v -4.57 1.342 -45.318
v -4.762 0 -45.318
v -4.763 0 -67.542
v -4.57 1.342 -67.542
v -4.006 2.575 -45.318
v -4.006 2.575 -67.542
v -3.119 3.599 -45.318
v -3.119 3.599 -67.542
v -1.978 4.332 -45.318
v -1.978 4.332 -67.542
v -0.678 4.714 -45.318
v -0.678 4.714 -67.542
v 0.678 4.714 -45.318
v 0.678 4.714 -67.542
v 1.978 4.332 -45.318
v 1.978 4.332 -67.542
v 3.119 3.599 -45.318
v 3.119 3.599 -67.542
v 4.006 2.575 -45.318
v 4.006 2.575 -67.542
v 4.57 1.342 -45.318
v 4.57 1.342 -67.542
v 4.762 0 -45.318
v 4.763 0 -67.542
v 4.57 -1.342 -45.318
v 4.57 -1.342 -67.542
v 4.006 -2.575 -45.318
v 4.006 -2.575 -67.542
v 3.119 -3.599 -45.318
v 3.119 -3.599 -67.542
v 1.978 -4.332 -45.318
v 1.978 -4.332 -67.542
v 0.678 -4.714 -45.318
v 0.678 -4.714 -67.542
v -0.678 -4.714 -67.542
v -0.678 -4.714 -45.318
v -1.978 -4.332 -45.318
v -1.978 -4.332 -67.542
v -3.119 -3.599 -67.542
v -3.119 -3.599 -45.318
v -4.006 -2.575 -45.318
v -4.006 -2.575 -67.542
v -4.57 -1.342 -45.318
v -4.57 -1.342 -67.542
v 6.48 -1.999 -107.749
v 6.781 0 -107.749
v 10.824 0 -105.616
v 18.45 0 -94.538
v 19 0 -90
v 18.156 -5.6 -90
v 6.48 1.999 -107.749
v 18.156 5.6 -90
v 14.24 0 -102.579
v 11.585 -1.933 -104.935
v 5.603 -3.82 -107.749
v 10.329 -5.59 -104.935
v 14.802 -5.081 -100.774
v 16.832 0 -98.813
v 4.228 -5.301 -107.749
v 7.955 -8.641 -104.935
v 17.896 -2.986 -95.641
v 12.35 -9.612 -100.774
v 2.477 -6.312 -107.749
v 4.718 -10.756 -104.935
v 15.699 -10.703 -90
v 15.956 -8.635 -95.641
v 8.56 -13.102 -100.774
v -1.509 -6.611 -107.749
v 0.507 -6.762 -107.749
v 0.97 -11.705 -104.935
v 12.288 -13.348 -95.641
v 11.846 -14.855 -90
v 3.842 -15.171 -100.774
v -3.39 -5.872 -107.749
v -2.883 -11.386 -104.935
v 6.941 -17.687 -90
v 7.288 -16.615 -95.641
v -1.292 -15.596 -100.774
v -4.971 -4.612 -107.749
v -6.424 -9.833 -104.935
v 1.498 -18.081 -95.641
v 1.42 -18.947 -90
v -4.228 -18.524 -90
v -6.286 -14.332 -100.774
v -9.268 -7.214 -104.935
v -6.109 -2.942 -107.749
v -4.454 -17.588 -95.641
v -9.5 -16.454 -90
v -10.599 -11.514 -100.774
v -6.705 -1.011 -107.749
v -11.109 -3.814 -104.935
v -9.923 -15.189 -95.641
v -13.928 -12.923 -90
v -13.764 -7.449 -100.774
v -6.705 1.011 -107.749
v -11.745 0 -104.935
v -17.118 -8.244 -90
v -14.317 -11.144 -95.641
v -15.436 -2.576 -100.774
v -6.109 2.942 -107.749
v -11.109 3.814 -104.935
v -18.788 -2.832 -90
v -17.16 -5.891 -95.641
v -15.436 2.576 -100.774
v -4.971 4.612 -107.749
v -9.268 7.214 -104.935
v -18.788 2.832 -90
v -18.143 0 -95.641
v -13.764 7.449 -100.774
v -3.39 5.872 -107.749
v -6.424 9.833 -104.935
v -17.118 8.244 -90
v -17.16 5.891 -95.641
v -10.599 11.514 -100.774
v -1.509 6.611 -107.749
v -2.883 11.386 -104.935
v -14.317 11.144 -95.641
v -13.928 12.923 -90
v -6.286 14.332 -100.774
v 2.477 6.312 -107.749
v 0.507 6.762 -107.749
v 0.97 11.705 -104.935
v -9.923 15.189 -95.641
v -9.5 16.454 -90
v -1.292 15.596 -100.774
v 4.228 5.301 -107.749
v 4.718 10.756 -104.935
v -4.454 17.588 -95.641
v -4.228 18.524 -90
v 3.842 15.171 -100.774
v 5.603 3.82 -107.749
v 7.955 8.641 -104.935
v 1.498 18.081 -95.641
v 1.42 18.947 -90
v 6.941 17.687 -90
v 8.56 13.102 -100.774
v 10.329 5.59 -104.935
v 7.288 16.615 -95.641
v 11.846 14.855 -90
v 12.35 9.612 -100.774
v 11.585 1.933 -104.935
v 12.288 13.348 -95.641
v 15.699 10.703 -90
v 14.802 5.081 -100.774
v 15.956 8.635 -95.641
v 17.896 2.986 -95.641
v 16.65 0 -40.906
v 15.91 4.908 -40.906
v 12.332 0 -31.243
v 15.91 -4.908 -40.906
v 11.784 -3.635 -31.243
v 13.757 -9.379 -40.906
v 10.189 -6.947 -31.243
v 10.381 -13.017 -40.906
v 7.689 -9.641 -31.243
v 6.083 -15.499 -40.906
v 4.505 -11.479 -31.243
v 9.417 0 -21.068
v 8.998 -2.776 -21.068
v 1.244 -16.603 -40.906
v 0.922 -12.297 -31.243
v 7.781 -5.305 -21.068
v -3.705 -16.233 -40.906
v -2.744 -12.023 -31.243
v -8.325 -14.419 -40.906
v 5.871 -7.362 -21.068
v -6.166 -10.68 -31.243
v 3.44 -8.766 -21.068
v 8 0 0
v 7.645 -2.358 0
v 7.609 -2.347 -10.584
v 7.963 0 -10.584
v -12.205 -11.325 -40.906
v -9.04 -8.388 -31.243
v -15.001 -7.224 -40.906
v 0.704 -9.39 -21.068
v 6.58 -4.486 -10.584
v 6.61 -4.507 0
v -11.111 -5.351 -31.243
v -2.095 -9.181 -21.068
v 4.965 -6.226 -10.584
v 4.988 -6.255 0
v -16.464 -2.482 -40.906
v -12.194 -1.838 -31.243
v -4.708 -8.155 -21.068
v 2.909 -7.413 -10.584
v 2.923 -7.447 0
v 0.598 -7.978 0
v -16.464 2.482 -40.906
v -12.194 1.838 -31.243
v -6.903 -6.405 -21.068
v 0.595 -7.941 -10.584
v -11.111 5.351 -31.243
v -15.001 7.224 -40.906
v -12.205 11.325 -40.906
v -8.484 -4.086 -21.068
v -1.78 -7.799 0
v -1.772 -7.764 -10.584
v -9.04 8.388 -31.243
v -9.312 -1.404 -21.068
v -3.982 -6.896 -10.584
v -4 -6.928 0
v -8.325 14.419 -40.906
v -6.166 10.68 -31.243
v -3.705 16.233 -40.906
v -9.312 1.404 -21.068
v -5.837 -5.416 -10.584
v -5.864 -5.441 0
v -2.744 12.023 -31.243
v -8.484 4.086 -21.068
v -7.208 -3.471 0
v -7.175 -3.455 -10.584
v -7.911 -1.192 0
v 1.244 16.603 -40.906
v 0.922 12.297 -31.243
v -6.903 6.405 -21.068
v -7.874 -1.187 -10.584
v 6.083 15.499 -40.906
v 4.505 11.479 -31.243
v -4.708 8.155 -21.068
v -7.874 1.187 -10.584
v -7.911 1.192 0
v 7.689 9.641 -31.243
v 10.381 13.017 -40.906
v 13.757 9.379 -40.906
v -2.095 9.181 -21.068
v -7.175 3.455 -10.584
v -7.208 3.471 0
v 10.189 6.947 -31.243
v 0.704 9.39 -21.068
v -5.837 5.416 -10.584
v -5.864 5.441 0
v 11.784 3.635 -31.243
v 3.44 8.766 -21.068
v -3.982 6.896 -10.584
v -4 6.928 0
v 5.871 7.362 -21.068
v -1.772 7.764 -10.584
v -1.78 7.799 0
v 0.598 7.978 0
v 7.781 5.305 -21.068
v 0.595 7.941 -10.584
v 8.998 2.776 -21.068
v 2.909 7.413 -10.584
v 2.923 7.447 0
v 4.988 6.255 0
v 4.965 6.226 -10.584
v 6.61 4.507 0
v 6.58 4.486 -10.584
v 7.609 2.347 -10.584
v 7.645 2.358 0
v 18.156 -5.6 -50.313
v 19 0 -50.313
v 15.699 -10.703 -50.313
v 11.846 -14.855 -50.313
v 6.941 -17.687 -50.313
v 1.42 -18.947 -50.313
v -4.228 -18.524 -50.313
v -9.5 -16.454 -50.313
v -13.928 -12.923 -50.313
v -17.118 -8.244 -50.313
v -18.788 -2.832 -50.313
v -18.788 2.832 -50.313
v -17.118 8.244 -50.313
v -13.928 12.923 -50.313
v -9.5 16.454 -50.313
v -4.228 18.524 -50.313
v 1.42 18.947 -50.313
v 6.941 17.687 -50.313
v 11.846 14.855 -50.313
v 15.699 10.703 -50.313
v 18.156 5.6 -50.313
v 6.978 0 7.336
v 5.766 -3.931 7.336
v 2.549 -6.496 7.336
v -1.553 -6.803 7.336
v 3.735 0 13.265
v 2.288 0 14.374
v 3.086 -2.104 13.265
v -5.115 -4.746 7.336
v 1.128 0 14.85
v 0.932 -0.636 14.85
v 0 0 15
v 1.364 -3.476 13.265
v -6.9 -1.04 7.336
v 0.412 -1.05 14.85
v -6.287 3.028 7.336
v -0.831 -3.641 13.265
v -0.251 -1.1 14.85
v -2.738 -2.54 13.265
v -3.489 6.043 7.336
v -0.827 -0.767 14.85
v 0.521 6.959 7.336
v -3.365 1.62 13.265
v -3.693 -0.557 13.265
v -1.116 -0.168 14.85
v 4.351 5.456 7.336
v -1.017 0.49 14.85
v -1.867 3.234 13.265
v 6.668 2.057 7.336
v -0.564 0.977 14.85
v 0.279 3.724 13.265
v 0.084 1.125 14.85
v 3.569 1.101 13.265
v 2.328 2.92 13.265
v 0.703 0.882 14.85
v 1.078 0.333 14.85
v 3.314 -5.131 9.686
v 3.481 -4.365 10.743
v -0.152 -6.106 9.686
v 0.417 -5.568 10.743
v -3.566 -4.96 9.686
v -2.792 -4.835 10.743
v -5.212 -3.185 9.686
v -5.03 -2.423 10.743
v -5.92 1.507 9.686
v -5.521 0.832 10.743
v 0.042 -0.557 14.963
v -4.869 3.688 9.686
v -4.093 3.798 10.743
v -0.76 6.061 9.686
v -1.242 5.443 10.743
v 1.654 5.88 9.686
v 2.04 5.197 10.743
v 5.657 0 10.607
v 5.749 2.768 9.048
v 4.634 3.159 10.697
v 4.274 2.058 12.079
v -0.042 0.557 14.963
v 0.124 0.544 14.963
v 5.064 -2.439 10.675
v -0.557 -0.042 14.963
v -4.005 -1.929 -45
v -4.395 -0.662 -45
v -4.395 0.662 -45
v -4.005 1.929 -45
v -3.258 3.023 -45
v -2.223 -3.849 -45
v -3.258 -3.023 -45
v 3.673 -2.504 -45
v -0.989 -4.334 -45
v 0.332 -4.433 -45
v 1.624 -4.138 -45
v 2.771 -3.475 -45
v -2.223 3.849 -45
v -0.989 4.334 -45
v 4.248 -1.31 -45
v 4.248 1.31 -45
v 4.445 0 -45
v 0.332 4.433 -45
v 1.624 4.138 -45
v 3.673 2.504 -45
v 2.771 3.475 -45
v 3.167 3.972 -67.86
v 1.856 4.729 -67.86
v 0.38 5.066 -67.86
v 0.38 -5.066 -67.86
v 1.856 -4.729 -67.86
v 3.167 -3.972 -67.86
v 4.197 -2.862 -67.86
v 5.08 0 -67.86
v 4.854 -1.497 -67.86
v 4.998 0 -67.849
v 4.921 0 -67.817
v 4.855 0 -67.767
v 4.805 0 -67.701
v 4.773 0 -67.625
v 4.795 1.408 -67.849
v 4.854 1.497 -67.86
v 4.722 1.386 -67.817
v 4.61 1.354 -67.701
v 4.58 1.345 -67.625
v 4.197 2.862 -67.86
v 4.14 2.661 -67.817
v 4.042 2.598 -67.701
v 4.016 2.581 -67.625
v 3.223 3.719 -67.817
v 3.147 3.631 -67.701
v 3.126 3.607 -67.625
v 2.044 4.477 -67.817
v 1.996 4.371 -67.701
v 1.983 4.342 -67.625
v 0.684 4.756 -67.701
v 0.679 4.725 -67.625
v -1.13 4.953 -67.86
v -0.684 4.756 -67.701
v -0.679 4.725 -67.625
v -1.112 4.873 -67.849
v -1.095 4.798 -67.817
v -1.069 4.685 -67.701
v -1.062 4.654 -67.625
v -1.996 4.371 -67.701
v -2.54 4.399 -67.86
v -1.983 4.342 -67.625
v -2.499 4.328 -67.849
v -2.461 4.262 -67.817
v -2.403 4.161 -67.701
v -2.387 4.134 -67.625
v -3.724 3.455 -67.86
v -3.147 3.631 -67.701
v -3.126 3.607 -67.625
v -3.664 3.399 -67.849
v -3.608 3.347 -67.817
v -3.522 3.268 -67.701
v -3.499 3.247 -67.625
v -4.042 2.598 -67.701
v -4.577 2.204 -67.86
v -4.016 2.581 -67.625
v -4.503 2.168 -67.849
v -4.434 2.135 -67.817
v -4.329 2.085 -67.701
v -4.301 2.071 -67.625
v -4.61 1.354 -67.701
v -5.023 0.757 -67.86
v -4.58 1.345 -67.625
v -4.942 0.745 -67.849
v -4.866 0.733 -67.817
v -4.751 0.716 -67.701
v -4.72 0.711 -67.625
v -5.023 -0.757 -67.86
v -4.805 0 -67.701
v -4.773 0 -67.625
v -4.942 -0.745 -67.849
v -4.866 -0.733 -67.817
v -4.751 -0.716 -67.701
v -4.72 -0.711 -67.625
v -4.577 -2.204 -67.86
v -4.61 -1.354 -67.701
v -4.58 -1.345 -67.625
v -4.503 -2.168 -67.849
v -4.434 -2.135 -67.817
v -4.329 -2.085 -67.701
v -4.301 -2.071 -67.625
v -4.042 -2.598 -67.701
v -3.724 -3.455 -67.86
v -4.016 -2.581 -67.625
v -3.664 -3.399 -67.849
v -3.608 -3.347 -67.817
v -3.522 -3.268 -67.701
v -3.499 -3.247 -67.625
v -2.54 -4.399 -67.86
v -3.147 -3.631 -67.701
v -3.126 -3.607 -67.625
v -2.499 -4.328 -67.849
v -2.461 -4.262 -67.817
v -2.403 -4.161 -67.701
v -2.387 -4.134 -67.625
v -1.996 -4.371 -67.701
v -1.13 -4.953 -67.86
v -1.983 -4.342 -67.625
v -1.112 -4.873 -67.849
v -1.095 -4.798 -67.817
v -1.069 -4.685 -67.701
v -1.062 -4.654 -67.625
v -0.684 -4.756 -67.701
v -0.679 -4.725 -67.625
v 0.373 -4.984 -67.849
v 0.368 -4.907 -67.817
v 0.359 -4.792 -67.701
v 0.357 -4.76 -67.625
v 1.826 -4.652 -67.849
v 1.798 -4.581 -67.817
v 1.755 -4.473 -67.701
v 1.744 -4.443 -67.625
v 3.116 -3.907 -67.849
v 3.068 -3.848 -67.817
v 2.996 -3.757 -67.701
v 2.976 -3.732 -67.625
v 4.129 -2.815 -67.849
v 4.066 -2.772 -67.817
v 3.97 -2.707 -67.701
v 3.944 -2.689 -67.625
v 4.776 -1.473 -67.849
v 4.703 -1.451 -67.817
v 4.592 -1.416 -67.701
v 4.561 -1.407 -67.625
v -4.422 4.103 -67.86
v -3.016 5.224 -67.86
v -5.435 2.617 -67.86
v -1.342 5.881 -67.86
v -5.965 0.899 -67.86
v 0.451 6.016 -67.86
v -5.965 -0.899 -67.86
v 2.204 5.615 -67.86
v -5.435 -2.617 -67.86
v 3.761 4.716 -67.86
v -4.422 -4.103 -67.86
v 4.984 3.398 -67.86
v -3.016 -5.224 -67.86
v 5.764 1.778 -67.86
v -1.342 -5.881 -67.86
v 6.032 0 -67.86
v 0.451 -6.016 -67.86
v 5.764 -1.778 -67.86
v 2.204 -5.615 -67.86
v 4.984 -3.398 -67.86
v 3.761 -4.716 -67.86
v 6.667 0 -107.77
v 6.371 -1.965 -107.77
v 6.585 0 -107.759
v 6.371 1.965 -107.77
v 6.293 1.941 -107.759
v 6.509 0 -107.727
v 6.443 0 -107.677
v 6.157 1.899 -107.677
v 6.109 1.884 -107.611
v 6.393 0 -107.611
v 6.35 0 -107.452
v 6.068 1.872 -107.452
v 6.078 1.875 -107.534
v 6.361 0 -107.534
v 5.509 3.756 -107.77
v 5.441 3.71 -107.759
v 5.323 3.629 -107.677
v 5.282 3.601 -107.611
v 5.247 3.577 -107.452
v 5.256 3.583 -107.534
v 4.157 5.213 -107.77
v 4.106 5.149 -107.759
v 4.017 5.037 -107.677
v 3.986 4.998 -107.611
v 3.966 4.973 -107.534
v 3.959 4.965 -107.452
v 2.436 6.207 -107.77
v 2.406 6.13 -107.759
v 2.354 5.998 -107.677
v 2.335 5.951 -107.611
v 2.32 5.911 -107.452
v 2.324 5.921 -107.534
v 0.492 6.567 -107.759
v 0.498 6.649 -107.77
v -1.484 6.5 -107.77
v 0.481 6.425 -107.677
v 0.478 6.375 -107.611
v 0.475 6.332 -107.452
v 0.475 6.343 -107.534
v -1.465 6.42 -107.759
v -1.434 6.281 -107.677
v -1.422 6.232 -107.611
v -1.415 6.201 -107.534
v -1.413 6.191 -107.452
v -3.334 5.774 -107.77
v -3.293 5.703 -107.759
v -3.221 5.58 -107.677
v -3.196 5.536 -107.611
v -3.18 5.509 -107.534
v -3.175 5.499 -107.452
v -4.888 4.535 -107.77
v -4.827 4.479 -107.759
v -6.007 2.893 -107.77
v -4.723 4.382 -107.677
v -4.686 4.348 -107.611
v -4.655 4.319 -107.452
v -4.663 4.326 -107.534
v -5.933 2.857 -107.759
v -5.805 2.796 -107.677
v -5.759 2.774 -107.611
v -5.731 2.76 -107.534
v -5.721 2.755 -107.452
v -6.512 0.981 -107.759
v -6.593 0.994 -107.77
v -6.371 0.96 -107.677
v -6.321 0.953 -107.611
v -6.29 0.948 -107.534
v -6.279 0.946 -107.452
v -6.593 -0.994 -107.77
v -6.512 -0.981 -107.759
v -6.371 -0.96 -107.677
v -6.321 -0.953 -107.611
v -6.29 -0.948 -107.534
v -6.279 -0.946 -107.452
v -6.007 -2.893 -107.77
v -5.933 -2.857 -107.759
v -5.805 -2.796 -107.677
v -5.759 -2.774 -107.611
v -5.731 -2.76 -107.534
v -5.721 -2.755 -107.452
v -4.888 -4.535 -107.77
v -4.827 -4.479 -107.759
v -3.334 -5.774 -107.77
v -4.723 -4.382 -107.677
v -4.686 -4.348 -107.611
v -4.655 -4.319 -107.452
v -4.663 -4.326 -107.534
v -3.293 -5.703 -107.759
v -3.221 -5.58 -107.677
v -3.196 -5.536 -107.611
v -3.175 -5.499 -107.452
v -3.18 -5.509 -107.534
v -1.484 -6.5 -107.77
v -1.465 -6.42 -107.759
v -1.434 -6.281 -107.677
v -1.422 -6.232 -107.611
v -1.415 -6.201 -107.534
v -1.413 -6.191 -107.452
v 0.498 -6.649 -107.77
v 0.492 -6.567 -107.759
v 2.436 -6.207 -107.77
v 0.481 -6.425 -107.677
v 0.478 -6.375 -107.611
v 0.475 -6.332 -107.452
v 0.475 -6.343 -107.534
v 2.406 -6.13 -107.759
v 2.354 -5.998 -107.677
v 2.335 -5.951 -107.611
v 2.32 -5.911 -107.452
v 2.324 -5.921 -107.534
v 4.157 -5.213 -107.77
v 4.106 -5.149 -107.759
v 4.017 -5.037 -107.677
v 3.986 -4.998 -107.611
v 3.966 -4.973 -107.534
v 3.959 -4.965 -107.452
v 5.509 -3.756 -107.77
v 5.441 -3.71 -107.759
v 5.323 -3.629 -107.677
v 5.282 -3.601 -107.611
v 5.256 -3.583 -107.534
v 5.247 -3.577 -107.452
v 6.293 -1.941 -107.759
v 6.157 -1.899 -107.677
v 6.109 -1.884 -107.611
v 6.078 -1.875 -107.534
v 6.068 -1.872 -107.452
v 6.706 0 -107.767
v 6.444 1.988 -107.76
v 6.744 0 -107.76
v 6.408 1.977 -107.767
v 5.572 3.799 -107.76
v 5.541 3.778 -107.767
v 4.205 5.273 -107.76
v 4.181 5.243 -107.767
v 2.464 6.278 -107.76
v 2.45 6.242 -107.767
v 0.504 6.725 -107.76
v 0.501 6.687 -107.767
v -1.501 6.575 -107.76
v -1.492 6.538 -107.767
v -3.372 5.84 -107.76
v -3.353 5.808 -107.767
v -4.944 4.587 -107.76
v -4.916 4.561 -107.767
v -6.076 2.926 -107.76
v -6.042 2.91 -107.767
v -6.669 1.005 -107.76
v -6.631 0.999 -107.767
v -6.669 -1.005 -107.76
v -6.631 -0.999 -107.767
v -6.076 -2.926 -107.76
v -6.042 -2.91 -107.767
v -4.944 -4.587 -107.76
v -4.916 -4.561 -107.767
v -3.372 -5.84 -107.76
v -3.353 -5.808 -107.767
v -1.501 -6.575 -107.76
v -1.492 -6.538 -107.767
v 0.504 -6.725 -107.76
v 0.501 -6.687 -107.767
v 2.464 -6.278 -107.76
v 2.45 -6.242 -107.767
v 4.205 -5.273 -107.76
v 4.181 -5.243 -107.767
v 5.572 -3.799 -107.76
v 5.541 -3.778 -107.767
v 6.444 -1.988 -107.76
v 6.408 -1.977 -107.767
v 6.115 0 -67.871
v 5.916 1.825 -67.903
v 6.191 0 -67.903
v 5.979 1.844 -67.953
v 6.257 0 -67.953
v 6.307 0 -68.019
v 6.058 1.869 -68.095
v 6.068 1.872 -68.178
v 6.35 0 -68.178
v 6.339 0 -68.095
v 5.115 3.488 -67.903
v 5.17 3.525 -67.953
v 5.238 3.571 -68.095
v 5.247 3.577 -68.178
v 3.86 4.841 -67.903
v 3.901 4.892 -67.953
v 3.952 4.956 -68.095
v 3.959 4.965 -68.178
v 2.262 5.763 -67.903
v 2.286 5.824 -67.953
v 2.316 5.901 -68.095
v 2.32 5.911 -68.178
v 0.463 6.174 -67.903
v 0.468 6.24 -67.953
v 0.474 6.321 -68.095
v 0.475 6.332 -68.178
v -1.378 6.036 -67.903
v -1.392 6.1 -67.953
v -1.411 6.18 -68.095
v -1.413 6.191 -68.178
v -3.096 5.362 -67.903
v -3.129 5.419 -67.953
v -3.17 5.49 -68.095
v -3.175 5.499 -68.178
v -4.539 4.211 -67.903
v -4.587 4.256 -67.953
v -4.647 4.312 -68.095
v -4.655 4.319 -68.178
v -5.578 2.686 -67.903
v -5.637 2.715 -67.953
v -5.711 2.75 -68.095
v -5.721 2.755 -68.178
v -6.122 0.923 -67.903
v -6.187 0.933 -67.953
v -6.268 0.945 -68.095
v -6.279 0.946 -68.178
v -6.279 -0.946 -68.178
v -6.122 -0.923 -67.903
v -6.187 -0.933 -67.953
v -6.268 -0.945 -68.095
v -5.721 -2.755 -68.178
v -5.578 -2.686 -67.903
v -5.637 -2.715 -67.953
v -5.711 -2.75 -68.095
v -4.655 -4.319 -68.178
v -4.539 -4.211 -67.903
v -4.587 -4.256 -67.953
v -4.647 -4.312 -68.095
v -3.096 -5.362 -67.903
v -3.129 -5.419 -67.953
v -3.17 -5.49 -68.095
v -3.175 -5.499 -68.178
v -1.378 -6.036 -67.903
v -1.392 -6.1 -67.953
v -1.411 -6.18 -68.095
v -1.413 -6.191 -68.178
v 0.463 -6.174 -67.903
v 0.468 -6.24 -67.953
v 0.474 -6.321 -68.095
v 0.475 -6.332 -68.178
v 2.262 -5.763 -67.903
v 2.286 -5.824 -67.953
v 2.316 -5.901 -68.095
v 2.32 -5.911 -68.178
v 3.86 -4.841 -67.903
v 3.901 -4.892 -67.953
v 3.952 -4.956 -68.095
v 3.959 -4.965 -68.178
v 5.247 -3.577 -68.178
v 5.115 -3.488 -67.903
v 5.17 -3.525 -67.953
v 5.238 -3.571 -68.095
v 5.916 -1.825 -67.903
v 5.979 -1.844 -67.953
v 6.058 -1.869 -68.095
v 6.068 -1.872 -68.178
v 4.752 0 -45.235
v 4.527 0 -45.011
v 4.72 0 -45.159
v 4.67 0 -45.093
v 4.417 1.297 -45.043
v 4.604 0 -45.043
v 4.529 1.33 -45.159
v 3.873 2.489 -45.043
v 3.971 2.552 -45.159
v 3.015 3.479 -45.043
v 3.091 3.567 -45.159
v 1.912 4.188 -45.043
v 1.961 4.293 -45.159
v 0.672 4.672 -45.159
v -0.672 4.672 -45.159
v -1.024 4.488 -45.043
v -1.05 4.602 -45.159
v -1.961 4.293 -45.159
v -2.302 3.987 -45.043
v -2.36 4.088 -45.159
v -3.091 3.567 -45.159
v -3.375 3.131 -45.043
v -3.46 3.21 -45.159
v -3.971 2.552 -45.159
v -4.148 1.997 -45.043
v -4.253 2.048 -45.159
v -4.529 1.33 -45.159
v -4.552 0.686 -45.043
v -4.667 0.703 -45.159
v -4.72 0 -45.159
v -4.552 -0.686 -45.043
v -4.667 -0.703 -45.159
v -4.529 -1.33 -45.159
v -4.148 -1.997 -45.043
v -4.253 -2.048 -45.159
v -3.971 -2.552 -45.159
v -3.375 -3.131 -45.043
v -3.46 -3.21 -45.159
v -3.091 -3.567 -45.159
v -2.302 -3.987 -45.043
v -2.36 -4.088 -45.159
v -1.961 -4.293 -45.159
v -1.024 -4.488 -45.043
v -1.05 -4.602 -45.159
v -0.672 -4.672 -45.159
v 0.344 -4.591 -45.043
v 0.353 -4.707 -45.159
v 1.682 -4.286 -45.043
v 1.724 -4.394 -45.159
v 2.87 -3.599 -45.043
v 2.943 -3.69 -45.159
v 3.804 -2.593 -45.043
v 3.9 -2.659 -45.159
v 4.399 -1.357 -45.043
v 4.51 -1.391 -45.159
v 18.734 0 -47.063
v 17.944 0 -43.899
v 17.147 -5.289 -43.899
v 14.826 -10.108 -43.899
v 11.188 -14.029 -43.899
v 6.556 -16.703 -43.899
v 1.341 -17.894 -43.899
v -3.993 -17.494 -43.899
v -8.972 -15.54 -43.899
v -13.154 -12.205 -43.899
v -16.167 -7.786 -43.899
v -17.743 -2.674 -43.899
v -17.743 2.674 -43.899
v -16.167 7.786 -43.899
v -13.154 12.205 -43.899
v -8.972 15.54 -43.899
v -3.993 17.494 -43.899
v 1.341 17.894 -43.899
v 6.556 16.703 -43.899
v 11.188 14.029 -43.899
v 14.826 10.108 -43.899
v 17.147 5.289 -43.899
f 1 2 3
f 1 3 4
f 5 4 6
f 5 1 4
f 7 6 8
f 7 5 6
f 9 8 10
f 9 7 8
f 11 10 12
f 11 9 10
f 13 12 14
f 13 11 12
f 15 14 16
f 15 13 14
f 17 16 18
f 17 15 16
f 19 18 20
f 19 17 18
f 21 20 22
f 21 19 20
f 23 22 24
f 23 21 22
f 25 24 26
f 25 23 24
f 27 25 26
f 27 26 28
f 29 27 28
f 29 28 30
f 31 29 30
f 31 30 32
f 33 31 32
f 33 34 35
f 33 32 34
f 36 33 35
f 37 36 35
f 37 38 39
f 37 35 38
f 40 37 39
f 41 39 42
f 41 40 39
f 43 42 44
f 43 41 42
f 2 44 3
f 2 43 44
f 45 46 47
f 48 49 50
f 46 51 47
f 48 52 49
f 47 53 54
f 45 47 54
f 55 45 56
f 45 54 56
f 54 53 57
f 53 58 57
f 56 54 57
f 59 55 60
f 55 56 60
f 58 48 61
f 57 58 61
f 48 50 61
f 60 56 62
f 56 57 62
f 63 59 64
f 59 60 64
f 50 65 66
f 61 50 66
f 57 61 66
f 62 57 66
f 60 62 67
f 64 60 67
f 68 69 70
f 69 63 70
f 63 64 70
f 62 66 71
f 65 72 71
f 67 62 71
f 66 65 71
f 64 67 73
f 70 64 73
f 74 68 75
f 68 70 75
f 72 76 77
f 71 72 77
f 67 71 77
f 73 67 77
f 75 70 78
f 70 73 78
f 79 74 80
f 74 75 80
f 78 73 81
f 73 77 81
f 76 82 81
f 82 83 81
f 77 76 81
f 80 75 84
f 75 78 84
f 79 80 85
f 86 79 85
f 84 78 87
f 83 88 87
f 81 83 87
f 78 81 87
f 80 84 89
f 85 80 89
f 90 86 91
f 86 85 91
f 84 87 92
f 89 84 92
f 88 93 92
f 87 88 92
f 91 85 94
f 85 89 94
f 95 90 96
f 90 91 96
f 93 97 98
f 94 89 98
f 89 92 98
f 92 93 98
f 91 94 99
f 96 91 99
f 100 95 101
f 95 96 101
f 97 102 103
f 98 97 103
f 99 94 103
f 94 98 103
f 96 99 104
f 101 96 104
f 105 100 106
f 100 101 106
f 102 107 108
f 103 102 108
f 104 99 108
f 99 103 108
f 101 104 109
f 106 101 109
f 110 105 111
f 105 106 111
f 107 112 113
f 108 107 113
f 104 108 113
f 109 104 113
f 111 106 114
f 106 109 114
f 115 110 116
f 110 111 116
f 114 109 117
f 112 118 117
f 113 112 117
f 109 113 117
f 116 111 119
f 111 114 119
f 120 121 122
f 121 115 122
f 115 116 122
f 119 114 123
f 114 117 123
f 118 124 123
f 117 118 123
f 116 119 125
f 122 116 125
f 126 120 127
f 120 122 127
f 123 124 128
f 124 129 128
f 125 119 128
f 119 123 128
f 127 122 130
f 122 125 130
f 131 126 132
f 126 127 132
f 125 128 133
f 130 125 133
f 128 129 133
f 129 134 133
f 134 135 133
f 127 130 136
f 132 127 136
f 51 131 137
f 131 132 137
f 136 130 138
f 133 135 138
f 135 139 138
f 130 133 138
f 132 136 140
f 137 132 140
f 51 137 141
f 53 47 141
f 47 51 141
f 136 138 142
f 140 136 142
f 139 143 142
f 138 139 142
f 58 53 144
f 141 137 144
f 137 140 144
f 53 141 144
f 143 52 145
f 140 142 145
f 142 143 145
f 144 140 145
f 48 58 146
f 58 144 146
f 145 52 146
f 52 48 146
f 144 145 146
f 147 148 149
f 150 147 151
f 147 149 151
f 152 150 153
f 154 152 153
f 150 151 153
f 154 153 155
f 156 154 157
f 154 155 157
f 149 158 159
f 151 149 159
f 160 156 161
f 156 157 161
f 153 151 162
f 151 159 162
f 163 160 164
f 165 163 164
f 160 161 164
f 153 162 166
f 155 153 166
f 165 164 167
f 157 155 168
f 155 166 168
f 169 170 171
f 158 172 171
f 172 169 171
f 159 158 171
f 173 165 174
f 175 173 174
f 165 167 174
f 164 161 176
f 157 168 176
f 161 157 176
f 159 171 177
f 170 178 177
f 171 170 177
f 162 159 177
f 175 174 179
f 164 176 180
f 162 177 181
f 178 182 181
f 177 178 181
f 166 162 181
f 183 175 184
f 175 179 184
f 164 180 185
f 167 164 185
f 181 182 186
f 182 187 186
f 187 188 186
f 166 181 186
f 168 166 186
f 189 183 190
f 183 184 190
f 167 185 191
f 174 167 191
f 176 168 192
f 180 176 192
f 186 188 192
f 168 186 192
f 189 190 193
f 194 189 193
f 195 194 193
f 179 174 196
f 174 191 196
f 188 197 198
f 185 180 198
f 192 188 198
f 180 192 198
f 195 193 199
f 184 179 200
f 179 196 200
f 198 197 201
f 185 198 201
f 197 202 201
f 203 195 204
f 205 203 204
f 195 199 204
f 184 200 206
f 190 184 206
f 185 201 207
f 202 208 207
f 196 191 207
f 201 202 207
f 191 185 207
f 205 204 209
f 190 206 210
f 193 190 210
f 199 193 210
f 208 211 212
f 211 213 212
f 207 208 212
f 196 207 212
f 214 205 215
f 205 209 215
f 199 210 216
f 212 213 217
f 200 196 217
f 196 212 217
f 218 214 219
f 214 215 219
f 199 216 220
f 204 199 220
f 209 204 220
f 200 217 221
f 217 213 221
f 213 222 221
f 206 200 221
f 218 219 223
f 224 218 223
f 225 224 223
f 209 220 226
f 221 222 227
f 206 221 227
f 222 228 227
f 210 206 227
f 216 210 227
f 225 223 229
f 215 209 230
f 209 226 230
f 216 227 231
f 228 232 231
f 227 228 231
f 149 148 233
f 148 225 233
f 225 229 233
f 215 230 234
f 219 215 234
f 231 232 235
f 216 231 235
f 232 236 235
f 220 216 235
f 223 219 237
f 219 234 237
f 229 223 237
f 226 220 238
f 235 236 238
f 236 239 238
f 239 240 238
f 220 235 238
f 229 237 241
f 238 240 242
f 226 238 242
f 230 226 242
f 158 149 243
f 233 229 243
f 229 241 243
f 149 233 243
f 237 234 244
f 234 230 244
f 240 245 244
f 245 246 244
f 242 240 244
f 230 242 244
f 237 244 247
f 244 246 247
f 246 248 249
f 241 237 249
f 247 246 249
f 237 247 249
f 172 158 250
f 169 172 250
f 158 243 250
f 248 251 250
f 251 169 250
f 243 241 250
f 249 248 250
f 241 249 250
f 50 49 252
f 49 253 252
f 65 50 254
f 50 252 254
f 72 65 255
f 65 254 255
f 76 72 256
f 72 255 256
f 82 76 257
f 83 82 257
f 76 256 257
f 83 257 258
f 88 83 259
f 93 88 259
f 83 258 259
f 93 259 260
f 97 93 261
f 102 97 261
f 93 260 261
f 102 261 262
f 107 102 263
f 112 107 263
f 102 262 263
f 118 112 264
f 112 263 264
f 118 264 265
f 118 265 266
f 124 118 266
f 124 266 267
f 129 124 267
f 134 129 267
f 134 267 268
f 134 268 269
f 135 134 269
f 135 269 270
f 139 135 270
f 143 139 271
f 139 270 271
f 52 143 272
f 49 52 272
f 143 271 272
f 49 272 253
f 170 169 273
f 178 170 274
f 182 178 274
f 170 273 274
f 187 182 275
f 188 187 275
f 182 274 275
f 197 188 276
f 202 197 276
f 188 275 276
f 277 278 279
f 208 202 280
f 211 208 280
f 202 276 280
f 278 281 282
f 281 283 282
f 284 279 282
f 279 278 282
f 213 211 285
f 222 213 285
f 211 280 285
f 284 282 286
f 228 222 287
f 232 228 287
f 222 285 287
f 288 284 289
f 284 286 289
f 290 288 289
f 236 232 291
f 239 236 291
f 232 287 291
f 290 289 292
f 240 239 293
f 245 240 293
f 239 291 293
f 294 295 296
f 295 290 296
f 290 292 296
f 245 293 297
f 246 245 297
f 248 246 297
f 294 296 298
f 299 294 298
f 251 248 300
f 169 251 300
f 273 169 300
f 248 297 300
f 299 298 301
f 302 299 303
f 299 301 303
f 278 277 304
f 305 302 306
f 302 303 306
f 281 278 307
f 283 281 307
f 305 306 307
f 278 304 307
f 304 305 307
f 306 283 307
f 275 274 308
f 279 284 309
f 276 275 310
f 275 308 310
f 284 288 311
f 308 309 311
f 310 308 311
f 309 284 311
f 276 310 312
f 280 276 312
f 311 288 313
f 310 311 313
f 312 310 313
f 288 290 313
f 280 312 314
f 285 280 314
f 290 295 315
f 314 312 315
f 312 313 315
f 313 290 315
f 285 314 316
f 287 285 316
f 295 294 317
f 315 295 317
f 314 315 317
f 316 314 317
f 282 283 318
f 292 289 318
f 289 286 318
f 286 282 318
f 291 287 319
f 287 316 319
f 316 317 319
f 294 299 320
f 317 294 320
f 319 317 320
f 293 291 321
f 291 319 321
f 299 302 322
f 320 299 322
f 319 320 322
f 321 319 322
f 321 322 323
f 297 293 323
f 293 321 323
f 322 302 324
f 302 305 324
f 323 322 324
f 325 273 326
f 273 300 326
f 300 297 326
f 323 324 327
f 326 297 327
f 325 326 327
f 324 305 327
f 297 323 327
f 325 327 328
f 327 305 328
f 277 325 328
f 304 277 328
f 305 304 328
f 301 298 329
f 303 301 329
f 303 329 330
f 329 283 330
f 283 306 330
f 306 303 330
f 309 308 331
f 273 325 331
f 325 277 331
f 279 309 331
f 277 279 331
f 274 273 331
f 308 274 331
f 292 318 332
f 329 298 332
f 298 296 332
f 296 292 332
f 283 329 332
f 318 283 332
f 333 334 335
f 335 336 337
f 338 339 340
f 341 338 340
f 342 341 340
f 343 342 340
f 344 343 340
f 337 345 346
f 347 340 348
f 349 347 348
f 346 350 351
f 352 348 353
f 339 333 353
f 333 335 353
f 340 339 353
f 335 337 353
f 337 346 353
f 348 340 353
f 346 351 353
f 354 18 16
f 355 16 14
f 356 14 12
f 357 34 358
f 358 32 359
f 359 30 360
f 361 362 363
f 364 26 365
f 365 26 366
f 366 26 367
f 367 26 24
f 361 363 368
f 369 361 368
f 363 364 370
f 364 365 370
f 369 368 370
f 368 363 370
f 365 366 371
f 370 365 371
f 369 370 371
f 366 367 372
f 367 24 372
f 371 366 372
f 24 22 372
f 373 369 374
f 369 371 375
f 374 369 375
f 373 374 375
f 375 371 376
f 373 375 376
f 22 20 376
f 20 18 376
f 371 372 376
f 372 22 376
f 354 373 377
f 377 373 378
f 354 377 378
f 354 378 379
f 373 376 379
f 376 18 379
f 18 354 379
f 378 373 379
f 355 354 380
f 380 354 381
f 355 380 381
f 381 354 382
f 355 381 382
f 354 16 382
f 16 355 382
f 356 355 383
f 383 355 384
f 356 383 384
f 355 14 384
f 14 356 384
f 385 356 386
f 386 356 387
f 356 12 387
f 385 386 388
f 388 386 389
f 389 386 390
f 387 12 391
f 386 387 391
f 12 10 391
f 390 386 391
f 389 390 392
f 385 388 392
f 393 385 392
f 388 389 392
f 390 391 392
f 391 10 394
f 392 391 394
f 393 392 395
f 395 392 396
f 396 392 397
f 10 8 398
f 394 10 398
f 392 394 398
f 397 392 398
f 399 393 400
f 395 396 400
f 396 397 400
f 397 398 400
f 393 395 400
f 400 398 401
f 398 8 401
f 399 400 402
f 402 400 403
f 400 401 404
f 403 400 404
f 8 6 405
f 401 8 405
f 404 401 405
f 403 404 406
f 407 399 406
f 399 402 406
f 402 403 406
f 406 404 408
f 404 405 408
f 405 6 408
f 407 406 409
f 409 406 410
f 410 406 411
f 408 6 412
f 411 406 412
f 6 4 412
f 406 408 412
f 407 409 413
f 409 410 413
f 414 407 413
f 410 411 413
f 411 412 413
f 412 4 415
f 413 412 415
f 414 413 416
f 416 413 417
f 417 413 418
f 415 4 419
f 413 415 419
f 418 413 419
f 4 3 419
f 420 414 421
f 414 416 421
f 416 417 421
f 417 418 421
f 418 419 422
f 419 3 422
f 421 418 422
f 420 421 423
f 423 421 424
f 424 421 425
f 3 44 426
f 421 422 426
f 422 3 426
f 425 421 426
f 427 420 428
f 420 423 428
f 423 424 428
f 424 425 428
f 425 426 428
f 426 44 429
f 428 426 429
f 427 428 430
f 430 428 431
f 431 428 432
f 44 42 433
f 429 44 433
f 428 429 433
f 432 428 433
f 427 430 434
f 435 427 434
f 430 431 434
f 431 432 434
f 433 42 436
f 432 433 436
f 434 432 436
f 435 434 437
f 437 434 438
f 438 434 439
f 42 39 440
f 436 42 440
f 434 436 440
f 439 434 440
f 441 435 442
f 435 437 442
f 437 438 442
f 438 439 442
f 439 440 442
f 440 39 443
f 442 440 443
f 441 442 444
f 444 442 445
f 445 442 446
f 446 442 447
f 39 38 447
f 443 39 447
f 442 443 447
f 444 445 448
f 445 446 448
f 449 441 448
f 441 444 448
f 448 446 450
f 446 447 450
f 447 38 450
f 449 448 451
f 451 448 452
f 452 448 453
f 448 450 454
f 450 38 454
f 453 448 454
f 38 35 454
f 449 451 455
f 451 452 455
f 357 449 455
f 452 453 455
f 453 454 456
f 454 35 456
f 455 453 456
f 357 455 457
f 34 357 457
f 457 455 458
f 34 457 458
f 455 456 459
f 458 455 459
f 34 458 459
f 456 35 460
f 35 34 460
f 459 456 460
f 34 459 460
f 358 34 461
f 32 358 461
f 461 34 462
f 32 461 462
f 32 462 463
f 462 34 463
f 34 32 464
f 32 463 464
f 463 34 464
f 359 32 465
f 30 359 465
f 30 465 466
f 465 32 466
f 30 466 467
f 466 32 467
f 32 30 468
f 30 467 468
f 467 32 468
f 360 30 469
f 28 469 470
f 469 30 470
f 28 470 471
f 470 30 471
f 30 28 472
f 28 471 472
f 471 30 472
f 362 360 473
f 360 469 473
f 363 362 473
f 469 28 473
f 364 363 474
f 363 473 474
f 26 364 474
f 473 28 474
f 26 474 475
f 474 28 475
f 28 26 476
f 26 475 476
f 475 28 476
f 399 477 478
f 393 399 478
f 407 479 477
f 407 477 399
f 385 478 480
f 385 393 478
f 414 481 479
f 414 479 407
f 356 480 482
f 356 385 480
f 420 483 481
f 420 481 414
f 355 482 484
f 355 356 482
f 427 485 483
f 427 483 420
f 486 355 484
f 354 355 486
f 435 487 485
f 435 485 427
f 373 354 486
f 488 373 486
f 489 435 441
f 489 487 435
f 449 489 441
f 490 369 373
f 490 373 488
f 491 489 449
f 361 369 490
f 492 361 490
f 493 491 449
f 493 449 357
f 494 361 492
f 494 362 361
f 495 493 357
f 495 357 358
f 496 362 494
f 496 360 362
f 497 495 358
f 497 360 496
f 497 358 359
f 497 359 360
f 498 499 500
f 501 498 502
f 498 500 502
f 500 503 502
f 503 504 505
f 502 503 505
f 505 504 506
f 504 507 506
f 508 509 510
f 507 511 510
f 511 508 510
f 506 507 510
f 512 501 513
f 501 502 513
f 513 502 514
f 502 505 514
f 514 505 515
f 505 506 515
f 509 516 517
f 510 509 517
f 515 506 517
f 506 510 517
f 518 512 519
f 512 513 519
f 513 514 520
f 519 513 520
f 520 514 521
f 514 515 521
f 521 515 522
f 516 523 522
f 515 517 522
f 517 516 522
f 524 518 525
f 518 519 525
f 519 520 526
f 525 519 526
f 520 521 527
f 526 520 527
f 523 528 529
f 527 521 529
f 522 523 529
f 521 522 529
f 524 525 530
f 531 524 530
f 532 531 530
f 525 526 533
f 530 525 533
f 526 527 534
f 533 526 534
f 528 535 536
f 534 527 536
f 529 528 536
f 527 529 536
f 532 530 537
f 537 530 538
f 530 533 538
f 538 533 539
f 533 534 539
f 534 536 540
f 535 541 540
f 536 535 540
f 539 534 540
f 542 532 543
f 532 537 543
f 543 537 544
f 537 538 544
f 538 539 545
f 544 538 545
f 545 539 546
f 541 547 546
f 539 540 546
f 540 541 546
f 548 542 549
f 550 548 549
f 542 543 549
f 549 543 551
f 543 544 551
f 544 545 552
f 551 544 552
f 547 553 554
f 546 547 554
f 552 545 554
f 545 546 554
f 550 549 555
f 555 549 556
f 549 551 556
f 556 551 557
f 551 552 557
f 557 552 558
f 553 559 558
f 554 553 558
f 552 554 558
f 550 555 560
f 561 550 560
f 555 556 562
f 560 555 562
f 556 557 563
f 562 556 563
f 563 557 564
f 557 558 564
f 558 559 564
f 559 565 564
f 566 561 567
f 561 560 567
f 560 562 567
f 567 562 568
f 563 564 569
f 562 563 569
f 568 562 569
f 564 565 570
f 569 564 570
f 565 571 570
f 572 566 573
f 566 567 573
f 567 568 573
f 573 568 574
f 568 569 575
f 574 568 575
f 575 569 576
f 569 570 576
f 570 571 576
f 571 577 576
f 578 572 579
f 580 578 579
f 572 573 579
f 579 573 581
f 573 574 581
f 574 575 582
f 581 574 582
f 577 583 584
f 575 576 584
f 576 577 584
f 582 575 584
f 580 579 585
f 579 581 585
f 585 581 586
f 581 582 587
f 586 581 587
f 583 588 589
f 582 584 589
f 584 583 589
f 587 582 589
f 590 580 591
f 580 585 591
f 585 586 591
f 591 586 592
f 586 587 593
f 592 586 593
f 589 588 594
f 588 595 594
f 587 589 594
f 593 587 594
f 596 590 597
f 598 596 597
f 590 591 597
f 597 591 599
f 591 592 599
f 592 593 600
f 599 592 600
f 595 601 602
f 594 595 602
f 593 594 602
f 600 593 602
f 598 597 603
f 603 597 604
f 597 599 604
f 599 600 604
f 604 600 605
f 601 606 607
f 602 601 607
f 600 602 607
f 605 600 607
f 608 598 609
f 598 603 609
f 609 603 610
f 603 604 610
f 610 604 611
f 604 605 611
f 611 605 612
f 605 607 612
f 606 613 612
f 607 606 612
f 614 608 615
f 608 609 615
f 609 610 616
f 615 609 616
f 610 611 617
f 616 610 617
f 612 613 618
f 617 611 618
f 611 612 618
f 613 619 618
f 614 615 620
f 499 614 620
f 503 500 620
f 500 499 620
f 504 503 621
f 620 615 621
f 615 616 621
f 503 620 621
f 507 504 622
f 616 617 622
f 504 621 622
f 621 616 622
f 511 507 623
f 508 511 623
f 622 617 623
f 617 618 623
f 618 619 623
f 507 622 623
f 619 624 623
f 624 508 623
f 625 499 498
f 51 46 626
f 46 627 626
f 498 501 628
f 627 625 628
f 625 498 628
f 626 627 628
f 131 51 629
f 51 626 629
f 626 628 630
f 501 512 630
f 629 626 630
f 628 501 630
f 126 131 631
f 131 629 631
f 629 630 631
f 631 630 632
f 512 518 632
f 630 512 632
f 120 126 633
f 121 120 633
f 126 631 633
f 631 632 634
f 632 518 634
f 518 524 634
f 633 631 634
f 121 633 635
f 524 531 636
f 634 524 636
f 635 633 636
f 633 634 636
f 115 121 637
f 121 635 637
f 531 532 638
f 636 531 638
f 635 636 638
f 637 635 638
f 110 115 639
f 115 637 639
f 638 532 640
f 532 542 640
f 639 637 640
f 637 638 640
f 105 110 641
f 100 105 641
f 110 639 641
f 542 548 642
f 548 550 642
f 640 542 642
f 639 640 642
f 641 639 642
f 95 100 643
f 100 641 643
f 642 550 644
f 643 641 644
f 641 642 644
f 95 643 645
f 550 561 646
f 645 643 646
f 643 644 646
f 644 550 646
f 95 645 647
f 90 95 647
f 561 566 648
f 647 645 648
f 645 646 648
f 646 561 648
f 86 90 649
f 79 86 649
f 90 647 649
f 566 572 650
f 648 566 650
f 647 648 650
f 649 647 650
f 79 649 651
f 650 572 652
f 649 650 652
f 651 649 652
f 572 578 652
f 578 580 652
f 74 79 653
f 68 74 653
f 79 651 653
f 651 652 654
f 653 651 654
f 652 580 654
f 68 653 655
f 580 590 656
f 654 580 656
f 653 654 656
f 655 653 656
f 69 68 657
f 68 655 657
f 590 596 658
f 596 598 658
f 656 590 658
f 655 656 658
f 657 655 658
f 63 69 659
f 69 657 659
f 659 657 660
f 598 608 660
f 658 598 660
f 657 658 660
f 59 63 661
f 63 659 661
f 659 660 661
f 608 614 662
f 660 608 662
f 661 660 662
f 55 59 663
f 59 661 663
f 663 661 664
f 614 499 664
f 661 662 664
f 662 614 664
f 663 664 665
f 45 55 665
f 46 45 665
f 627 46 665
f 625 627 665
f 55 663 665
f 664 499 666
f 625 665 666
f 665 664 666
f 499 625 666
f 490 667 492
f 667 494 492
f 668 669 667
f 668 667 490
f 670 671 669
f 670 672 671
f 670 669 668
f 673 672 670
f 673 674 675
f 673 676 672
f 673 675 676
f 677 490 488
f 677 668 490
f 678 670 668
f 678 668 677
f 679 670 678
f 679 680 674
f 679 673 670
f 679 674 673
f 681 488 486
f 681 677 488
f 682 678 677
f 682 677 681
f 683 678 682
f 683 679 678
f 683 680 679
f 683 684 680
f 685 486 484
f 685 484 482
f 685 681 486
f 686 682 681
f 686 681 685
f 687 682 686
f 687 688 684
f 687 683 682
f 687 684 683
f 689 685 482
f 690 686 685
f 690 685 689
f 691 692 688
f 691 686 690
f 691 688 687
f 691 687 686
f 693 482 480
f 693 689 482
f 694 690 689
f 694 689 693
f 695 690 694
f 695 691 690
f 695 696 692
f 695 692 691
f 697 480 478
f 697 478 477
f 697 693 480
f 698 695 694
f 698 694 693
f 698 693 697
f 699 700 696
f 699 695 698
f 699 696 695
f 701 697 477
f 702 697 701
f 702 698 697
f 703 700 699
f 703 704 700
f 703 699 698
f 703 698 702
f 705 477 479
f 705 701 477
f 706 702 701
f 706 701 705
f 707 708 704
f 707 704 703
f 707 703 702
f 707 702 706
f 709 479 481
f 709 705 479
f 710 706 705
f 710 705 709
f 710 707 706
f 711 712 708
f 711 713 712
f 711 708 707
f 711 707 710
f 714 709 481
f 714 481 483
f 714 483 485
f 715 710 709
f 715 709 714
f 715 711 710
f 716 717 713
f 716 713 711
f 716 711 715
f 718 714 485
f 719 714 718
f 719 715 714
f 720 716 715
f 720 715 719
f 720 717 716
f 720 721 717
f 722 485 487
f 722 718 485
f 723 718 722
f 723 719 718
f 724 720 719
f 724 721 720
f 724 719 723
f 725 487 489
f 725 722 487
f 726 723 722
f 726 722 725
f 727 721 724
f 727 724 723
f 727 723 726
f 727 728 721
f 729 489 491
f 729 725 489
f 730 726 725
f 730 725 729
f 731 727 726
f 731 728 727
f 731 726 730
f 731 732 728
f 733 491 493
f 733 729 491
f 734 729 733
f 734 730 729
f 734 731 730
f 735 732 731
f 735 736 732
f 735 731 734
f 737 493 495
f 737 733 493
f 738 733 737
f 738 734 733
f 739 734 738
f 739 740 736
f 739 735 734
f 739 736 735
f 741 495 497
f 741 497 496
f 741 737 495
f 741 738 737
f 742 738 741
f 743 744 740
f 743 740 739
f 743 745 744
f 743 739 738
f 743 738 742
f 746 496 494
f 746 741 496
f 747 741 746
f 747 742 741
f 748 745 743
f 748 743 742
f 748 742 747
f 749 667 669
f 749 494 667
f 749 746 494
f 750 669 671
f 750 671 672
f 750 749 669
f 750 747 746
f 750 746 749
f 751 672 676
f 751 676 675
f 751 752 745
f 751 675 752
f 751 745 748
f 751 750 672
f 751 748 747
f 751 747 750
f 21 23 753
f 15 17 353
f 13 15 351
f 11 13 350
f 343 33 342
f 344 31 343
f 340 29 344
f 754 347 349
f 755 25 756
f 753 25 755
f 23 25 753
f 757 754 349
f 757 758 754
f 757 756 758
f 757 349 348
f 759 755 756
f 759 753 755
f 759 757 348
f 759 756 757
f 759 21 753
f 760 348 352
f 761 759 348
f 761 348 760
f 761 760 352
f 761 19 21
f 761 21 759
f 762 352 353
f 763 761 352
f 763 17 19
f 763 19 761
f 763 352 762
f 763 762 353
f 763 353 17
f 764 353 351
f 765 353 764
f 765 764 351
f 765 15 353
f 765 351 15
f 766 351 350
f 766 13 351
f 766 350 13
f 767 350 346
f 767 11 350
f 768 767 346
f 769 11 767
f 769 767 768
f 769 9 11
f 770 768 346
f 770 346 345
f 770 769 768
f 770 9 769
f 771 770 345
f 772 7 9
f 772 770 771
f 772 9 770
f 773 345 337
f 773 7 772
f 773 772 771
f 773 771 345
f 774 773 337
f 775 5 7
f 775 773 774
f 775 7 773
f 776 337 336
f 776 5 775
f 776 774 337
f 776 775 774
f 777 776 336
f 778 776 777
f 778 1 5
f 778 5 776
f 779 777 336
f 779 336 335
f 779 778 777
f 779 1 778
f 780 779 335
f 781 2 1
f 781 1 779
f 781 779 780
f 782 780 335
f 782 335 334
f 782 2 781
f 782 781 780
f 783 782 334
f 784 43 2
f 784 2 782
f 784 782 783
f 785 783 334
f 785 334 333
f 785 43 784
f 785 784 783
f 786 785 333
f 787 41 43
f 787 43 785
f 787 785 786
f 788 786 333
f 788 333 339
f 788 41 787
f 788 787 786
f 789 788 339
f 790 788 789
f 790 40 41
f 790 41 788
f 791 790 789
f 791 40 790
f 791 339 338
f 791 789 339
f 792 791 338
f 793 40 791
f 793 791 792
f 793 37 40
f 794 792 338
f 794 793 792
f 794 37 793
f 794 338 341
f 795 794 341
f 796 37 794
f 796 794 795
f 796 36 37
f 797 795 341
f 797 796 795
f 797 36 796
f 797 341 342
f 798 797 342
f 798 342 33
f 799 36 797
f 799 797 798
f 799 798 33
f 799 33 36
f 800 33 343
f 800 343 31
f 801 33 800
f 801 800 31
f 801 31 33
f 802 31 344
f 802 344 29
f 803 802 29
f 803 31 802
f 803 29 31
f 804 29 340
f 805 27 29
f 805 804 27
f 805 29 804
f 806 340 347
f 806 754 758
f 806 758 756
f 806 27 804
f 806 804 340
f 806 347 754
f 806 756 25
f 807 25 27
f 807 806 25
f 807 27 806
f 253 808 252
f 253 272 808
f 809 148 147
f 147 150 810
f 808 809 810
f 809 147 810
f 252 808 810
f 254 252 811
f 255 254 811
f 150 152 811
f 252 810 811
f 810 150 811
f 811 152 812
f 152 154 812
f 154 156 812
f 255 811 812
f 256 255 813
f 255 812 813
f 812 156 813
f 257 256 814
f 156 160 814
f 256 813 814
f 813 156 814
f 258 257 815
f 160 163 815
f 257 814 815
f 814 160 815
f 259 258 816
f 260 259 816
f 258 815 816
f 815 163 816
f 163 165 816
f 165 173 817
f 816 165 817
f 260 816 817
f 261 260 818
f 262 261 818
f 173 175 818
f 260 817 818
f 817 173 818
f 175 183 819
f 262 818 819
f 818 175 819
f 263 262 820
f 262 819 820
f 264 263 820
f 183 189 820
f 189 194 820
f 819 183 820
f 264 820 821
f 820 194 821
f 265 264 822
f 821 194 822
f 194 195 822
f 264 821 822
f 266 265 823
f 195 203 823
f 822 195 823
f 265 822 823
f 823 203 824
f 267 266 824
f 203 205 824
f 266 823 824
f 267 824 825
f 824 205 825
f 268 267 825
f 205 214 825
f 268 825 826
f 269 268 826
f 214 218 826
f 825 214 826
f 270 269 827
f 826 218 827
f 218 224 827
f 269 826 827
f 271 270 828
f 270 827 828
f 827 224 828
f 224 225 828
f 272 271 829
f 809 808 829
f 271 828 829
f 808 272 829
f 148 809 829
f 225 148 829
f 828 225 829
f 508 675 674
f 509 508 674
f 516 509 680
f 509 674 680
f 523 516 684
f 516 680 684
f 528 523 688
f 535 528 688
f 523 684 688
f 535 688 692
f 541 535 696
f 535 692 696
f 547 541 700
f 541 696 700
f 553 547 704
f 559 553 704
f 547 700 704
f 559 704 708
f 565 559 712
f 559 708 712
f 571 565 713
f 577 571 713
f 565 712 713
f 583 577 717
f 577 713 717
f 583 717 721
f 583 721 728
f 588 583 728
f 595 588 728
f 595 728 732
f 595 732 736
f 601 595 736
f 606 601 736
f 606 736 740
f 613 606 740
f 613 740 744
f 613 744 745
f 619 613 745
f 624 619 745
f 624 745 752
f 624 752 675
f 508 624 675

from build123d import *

# Parameters (mm, degrees)
CUT_EXTRUDE2_START  = -45
SKETCH2_R           = 6.35
CUT_EXTRUDE2_DEPTH  = 68.263083904
SKETCH6_R           = 6.35
SKETCH6_R_2         = 4.7625
BOSS_EXTRUDE3_DEPTH = 22.86
FILLET2_R           = 0.3175


with BuildPart() as part:
    # Sketch1 → Revolve1 (revolve)
    with BuildSketch(Plane(origin=(0, 0, 0), x_dir=(0, 0, -1), z_dir=(0, 1, 0))):
        with BuildLine():
            Line((-15, 0), (109, 0))
            ThreePointArc((109, 0), (103.435028843, 13.435028843), (90, 19))
            Line((90, 19), (50.312566576, 19))
            ThreePointArc((50.312566576, 19), (45.46484169, 18.403596662), (40.906236735, 16.649956343))
            ThreePointArc((40.906236735, 16.649956343), (21.06807377, 9.416811899), (0, 8))
            add(Edge.make_bspline(
                [(0, 8), (-15, 8), (-15, 0)],
                knots=[4.71238898, 4.71238898, 4.71238898, 6.283185307, 6.283185307, 6.283185307], degree=2, weights=[1, 0.707106781, 1]))
        make_face()
    revolve(axis=Axis((0, 0, 15), (0, 0, -1)))

    # Sketch2 → Cut-Extrude2 (cut, through all)
    with BuildSketch(Plane.XY.offset(CUT_EXTRUDE2_START)):
        Circle(SKETCH2_R)
    extrude(amount=-CUT_EXTRUDE2_DEPTH, mode=Mode.SUBTRACT)

    # Sketch6 → Boss-Extrude3 (add)
    with BuildSketch(Plane(origin=(0, 0, -45), x_dir=(-1, 0, 0), z_dir=(0, 0, -1))):
        Circle(SKETCH6_R)
        Circle(SKETCH6_R_2, mode=Mode.SUBTRACT)
    extrude(amount=BOSS_EXTRUDE3_DEPTH)

    # Fillet2
    fillet2_edges = [part.edges().sort_by_distance(p)[0] for p in [
        (0, -6.35, -107.907470508),
        (-6.35, 0, -67.86),
        (4.7625, 0, -67.86),
        (4.7625, 0, -45),
    ]]
    fillet(fillet2_edges, radius=FILLET2_R)


solid = part.part
